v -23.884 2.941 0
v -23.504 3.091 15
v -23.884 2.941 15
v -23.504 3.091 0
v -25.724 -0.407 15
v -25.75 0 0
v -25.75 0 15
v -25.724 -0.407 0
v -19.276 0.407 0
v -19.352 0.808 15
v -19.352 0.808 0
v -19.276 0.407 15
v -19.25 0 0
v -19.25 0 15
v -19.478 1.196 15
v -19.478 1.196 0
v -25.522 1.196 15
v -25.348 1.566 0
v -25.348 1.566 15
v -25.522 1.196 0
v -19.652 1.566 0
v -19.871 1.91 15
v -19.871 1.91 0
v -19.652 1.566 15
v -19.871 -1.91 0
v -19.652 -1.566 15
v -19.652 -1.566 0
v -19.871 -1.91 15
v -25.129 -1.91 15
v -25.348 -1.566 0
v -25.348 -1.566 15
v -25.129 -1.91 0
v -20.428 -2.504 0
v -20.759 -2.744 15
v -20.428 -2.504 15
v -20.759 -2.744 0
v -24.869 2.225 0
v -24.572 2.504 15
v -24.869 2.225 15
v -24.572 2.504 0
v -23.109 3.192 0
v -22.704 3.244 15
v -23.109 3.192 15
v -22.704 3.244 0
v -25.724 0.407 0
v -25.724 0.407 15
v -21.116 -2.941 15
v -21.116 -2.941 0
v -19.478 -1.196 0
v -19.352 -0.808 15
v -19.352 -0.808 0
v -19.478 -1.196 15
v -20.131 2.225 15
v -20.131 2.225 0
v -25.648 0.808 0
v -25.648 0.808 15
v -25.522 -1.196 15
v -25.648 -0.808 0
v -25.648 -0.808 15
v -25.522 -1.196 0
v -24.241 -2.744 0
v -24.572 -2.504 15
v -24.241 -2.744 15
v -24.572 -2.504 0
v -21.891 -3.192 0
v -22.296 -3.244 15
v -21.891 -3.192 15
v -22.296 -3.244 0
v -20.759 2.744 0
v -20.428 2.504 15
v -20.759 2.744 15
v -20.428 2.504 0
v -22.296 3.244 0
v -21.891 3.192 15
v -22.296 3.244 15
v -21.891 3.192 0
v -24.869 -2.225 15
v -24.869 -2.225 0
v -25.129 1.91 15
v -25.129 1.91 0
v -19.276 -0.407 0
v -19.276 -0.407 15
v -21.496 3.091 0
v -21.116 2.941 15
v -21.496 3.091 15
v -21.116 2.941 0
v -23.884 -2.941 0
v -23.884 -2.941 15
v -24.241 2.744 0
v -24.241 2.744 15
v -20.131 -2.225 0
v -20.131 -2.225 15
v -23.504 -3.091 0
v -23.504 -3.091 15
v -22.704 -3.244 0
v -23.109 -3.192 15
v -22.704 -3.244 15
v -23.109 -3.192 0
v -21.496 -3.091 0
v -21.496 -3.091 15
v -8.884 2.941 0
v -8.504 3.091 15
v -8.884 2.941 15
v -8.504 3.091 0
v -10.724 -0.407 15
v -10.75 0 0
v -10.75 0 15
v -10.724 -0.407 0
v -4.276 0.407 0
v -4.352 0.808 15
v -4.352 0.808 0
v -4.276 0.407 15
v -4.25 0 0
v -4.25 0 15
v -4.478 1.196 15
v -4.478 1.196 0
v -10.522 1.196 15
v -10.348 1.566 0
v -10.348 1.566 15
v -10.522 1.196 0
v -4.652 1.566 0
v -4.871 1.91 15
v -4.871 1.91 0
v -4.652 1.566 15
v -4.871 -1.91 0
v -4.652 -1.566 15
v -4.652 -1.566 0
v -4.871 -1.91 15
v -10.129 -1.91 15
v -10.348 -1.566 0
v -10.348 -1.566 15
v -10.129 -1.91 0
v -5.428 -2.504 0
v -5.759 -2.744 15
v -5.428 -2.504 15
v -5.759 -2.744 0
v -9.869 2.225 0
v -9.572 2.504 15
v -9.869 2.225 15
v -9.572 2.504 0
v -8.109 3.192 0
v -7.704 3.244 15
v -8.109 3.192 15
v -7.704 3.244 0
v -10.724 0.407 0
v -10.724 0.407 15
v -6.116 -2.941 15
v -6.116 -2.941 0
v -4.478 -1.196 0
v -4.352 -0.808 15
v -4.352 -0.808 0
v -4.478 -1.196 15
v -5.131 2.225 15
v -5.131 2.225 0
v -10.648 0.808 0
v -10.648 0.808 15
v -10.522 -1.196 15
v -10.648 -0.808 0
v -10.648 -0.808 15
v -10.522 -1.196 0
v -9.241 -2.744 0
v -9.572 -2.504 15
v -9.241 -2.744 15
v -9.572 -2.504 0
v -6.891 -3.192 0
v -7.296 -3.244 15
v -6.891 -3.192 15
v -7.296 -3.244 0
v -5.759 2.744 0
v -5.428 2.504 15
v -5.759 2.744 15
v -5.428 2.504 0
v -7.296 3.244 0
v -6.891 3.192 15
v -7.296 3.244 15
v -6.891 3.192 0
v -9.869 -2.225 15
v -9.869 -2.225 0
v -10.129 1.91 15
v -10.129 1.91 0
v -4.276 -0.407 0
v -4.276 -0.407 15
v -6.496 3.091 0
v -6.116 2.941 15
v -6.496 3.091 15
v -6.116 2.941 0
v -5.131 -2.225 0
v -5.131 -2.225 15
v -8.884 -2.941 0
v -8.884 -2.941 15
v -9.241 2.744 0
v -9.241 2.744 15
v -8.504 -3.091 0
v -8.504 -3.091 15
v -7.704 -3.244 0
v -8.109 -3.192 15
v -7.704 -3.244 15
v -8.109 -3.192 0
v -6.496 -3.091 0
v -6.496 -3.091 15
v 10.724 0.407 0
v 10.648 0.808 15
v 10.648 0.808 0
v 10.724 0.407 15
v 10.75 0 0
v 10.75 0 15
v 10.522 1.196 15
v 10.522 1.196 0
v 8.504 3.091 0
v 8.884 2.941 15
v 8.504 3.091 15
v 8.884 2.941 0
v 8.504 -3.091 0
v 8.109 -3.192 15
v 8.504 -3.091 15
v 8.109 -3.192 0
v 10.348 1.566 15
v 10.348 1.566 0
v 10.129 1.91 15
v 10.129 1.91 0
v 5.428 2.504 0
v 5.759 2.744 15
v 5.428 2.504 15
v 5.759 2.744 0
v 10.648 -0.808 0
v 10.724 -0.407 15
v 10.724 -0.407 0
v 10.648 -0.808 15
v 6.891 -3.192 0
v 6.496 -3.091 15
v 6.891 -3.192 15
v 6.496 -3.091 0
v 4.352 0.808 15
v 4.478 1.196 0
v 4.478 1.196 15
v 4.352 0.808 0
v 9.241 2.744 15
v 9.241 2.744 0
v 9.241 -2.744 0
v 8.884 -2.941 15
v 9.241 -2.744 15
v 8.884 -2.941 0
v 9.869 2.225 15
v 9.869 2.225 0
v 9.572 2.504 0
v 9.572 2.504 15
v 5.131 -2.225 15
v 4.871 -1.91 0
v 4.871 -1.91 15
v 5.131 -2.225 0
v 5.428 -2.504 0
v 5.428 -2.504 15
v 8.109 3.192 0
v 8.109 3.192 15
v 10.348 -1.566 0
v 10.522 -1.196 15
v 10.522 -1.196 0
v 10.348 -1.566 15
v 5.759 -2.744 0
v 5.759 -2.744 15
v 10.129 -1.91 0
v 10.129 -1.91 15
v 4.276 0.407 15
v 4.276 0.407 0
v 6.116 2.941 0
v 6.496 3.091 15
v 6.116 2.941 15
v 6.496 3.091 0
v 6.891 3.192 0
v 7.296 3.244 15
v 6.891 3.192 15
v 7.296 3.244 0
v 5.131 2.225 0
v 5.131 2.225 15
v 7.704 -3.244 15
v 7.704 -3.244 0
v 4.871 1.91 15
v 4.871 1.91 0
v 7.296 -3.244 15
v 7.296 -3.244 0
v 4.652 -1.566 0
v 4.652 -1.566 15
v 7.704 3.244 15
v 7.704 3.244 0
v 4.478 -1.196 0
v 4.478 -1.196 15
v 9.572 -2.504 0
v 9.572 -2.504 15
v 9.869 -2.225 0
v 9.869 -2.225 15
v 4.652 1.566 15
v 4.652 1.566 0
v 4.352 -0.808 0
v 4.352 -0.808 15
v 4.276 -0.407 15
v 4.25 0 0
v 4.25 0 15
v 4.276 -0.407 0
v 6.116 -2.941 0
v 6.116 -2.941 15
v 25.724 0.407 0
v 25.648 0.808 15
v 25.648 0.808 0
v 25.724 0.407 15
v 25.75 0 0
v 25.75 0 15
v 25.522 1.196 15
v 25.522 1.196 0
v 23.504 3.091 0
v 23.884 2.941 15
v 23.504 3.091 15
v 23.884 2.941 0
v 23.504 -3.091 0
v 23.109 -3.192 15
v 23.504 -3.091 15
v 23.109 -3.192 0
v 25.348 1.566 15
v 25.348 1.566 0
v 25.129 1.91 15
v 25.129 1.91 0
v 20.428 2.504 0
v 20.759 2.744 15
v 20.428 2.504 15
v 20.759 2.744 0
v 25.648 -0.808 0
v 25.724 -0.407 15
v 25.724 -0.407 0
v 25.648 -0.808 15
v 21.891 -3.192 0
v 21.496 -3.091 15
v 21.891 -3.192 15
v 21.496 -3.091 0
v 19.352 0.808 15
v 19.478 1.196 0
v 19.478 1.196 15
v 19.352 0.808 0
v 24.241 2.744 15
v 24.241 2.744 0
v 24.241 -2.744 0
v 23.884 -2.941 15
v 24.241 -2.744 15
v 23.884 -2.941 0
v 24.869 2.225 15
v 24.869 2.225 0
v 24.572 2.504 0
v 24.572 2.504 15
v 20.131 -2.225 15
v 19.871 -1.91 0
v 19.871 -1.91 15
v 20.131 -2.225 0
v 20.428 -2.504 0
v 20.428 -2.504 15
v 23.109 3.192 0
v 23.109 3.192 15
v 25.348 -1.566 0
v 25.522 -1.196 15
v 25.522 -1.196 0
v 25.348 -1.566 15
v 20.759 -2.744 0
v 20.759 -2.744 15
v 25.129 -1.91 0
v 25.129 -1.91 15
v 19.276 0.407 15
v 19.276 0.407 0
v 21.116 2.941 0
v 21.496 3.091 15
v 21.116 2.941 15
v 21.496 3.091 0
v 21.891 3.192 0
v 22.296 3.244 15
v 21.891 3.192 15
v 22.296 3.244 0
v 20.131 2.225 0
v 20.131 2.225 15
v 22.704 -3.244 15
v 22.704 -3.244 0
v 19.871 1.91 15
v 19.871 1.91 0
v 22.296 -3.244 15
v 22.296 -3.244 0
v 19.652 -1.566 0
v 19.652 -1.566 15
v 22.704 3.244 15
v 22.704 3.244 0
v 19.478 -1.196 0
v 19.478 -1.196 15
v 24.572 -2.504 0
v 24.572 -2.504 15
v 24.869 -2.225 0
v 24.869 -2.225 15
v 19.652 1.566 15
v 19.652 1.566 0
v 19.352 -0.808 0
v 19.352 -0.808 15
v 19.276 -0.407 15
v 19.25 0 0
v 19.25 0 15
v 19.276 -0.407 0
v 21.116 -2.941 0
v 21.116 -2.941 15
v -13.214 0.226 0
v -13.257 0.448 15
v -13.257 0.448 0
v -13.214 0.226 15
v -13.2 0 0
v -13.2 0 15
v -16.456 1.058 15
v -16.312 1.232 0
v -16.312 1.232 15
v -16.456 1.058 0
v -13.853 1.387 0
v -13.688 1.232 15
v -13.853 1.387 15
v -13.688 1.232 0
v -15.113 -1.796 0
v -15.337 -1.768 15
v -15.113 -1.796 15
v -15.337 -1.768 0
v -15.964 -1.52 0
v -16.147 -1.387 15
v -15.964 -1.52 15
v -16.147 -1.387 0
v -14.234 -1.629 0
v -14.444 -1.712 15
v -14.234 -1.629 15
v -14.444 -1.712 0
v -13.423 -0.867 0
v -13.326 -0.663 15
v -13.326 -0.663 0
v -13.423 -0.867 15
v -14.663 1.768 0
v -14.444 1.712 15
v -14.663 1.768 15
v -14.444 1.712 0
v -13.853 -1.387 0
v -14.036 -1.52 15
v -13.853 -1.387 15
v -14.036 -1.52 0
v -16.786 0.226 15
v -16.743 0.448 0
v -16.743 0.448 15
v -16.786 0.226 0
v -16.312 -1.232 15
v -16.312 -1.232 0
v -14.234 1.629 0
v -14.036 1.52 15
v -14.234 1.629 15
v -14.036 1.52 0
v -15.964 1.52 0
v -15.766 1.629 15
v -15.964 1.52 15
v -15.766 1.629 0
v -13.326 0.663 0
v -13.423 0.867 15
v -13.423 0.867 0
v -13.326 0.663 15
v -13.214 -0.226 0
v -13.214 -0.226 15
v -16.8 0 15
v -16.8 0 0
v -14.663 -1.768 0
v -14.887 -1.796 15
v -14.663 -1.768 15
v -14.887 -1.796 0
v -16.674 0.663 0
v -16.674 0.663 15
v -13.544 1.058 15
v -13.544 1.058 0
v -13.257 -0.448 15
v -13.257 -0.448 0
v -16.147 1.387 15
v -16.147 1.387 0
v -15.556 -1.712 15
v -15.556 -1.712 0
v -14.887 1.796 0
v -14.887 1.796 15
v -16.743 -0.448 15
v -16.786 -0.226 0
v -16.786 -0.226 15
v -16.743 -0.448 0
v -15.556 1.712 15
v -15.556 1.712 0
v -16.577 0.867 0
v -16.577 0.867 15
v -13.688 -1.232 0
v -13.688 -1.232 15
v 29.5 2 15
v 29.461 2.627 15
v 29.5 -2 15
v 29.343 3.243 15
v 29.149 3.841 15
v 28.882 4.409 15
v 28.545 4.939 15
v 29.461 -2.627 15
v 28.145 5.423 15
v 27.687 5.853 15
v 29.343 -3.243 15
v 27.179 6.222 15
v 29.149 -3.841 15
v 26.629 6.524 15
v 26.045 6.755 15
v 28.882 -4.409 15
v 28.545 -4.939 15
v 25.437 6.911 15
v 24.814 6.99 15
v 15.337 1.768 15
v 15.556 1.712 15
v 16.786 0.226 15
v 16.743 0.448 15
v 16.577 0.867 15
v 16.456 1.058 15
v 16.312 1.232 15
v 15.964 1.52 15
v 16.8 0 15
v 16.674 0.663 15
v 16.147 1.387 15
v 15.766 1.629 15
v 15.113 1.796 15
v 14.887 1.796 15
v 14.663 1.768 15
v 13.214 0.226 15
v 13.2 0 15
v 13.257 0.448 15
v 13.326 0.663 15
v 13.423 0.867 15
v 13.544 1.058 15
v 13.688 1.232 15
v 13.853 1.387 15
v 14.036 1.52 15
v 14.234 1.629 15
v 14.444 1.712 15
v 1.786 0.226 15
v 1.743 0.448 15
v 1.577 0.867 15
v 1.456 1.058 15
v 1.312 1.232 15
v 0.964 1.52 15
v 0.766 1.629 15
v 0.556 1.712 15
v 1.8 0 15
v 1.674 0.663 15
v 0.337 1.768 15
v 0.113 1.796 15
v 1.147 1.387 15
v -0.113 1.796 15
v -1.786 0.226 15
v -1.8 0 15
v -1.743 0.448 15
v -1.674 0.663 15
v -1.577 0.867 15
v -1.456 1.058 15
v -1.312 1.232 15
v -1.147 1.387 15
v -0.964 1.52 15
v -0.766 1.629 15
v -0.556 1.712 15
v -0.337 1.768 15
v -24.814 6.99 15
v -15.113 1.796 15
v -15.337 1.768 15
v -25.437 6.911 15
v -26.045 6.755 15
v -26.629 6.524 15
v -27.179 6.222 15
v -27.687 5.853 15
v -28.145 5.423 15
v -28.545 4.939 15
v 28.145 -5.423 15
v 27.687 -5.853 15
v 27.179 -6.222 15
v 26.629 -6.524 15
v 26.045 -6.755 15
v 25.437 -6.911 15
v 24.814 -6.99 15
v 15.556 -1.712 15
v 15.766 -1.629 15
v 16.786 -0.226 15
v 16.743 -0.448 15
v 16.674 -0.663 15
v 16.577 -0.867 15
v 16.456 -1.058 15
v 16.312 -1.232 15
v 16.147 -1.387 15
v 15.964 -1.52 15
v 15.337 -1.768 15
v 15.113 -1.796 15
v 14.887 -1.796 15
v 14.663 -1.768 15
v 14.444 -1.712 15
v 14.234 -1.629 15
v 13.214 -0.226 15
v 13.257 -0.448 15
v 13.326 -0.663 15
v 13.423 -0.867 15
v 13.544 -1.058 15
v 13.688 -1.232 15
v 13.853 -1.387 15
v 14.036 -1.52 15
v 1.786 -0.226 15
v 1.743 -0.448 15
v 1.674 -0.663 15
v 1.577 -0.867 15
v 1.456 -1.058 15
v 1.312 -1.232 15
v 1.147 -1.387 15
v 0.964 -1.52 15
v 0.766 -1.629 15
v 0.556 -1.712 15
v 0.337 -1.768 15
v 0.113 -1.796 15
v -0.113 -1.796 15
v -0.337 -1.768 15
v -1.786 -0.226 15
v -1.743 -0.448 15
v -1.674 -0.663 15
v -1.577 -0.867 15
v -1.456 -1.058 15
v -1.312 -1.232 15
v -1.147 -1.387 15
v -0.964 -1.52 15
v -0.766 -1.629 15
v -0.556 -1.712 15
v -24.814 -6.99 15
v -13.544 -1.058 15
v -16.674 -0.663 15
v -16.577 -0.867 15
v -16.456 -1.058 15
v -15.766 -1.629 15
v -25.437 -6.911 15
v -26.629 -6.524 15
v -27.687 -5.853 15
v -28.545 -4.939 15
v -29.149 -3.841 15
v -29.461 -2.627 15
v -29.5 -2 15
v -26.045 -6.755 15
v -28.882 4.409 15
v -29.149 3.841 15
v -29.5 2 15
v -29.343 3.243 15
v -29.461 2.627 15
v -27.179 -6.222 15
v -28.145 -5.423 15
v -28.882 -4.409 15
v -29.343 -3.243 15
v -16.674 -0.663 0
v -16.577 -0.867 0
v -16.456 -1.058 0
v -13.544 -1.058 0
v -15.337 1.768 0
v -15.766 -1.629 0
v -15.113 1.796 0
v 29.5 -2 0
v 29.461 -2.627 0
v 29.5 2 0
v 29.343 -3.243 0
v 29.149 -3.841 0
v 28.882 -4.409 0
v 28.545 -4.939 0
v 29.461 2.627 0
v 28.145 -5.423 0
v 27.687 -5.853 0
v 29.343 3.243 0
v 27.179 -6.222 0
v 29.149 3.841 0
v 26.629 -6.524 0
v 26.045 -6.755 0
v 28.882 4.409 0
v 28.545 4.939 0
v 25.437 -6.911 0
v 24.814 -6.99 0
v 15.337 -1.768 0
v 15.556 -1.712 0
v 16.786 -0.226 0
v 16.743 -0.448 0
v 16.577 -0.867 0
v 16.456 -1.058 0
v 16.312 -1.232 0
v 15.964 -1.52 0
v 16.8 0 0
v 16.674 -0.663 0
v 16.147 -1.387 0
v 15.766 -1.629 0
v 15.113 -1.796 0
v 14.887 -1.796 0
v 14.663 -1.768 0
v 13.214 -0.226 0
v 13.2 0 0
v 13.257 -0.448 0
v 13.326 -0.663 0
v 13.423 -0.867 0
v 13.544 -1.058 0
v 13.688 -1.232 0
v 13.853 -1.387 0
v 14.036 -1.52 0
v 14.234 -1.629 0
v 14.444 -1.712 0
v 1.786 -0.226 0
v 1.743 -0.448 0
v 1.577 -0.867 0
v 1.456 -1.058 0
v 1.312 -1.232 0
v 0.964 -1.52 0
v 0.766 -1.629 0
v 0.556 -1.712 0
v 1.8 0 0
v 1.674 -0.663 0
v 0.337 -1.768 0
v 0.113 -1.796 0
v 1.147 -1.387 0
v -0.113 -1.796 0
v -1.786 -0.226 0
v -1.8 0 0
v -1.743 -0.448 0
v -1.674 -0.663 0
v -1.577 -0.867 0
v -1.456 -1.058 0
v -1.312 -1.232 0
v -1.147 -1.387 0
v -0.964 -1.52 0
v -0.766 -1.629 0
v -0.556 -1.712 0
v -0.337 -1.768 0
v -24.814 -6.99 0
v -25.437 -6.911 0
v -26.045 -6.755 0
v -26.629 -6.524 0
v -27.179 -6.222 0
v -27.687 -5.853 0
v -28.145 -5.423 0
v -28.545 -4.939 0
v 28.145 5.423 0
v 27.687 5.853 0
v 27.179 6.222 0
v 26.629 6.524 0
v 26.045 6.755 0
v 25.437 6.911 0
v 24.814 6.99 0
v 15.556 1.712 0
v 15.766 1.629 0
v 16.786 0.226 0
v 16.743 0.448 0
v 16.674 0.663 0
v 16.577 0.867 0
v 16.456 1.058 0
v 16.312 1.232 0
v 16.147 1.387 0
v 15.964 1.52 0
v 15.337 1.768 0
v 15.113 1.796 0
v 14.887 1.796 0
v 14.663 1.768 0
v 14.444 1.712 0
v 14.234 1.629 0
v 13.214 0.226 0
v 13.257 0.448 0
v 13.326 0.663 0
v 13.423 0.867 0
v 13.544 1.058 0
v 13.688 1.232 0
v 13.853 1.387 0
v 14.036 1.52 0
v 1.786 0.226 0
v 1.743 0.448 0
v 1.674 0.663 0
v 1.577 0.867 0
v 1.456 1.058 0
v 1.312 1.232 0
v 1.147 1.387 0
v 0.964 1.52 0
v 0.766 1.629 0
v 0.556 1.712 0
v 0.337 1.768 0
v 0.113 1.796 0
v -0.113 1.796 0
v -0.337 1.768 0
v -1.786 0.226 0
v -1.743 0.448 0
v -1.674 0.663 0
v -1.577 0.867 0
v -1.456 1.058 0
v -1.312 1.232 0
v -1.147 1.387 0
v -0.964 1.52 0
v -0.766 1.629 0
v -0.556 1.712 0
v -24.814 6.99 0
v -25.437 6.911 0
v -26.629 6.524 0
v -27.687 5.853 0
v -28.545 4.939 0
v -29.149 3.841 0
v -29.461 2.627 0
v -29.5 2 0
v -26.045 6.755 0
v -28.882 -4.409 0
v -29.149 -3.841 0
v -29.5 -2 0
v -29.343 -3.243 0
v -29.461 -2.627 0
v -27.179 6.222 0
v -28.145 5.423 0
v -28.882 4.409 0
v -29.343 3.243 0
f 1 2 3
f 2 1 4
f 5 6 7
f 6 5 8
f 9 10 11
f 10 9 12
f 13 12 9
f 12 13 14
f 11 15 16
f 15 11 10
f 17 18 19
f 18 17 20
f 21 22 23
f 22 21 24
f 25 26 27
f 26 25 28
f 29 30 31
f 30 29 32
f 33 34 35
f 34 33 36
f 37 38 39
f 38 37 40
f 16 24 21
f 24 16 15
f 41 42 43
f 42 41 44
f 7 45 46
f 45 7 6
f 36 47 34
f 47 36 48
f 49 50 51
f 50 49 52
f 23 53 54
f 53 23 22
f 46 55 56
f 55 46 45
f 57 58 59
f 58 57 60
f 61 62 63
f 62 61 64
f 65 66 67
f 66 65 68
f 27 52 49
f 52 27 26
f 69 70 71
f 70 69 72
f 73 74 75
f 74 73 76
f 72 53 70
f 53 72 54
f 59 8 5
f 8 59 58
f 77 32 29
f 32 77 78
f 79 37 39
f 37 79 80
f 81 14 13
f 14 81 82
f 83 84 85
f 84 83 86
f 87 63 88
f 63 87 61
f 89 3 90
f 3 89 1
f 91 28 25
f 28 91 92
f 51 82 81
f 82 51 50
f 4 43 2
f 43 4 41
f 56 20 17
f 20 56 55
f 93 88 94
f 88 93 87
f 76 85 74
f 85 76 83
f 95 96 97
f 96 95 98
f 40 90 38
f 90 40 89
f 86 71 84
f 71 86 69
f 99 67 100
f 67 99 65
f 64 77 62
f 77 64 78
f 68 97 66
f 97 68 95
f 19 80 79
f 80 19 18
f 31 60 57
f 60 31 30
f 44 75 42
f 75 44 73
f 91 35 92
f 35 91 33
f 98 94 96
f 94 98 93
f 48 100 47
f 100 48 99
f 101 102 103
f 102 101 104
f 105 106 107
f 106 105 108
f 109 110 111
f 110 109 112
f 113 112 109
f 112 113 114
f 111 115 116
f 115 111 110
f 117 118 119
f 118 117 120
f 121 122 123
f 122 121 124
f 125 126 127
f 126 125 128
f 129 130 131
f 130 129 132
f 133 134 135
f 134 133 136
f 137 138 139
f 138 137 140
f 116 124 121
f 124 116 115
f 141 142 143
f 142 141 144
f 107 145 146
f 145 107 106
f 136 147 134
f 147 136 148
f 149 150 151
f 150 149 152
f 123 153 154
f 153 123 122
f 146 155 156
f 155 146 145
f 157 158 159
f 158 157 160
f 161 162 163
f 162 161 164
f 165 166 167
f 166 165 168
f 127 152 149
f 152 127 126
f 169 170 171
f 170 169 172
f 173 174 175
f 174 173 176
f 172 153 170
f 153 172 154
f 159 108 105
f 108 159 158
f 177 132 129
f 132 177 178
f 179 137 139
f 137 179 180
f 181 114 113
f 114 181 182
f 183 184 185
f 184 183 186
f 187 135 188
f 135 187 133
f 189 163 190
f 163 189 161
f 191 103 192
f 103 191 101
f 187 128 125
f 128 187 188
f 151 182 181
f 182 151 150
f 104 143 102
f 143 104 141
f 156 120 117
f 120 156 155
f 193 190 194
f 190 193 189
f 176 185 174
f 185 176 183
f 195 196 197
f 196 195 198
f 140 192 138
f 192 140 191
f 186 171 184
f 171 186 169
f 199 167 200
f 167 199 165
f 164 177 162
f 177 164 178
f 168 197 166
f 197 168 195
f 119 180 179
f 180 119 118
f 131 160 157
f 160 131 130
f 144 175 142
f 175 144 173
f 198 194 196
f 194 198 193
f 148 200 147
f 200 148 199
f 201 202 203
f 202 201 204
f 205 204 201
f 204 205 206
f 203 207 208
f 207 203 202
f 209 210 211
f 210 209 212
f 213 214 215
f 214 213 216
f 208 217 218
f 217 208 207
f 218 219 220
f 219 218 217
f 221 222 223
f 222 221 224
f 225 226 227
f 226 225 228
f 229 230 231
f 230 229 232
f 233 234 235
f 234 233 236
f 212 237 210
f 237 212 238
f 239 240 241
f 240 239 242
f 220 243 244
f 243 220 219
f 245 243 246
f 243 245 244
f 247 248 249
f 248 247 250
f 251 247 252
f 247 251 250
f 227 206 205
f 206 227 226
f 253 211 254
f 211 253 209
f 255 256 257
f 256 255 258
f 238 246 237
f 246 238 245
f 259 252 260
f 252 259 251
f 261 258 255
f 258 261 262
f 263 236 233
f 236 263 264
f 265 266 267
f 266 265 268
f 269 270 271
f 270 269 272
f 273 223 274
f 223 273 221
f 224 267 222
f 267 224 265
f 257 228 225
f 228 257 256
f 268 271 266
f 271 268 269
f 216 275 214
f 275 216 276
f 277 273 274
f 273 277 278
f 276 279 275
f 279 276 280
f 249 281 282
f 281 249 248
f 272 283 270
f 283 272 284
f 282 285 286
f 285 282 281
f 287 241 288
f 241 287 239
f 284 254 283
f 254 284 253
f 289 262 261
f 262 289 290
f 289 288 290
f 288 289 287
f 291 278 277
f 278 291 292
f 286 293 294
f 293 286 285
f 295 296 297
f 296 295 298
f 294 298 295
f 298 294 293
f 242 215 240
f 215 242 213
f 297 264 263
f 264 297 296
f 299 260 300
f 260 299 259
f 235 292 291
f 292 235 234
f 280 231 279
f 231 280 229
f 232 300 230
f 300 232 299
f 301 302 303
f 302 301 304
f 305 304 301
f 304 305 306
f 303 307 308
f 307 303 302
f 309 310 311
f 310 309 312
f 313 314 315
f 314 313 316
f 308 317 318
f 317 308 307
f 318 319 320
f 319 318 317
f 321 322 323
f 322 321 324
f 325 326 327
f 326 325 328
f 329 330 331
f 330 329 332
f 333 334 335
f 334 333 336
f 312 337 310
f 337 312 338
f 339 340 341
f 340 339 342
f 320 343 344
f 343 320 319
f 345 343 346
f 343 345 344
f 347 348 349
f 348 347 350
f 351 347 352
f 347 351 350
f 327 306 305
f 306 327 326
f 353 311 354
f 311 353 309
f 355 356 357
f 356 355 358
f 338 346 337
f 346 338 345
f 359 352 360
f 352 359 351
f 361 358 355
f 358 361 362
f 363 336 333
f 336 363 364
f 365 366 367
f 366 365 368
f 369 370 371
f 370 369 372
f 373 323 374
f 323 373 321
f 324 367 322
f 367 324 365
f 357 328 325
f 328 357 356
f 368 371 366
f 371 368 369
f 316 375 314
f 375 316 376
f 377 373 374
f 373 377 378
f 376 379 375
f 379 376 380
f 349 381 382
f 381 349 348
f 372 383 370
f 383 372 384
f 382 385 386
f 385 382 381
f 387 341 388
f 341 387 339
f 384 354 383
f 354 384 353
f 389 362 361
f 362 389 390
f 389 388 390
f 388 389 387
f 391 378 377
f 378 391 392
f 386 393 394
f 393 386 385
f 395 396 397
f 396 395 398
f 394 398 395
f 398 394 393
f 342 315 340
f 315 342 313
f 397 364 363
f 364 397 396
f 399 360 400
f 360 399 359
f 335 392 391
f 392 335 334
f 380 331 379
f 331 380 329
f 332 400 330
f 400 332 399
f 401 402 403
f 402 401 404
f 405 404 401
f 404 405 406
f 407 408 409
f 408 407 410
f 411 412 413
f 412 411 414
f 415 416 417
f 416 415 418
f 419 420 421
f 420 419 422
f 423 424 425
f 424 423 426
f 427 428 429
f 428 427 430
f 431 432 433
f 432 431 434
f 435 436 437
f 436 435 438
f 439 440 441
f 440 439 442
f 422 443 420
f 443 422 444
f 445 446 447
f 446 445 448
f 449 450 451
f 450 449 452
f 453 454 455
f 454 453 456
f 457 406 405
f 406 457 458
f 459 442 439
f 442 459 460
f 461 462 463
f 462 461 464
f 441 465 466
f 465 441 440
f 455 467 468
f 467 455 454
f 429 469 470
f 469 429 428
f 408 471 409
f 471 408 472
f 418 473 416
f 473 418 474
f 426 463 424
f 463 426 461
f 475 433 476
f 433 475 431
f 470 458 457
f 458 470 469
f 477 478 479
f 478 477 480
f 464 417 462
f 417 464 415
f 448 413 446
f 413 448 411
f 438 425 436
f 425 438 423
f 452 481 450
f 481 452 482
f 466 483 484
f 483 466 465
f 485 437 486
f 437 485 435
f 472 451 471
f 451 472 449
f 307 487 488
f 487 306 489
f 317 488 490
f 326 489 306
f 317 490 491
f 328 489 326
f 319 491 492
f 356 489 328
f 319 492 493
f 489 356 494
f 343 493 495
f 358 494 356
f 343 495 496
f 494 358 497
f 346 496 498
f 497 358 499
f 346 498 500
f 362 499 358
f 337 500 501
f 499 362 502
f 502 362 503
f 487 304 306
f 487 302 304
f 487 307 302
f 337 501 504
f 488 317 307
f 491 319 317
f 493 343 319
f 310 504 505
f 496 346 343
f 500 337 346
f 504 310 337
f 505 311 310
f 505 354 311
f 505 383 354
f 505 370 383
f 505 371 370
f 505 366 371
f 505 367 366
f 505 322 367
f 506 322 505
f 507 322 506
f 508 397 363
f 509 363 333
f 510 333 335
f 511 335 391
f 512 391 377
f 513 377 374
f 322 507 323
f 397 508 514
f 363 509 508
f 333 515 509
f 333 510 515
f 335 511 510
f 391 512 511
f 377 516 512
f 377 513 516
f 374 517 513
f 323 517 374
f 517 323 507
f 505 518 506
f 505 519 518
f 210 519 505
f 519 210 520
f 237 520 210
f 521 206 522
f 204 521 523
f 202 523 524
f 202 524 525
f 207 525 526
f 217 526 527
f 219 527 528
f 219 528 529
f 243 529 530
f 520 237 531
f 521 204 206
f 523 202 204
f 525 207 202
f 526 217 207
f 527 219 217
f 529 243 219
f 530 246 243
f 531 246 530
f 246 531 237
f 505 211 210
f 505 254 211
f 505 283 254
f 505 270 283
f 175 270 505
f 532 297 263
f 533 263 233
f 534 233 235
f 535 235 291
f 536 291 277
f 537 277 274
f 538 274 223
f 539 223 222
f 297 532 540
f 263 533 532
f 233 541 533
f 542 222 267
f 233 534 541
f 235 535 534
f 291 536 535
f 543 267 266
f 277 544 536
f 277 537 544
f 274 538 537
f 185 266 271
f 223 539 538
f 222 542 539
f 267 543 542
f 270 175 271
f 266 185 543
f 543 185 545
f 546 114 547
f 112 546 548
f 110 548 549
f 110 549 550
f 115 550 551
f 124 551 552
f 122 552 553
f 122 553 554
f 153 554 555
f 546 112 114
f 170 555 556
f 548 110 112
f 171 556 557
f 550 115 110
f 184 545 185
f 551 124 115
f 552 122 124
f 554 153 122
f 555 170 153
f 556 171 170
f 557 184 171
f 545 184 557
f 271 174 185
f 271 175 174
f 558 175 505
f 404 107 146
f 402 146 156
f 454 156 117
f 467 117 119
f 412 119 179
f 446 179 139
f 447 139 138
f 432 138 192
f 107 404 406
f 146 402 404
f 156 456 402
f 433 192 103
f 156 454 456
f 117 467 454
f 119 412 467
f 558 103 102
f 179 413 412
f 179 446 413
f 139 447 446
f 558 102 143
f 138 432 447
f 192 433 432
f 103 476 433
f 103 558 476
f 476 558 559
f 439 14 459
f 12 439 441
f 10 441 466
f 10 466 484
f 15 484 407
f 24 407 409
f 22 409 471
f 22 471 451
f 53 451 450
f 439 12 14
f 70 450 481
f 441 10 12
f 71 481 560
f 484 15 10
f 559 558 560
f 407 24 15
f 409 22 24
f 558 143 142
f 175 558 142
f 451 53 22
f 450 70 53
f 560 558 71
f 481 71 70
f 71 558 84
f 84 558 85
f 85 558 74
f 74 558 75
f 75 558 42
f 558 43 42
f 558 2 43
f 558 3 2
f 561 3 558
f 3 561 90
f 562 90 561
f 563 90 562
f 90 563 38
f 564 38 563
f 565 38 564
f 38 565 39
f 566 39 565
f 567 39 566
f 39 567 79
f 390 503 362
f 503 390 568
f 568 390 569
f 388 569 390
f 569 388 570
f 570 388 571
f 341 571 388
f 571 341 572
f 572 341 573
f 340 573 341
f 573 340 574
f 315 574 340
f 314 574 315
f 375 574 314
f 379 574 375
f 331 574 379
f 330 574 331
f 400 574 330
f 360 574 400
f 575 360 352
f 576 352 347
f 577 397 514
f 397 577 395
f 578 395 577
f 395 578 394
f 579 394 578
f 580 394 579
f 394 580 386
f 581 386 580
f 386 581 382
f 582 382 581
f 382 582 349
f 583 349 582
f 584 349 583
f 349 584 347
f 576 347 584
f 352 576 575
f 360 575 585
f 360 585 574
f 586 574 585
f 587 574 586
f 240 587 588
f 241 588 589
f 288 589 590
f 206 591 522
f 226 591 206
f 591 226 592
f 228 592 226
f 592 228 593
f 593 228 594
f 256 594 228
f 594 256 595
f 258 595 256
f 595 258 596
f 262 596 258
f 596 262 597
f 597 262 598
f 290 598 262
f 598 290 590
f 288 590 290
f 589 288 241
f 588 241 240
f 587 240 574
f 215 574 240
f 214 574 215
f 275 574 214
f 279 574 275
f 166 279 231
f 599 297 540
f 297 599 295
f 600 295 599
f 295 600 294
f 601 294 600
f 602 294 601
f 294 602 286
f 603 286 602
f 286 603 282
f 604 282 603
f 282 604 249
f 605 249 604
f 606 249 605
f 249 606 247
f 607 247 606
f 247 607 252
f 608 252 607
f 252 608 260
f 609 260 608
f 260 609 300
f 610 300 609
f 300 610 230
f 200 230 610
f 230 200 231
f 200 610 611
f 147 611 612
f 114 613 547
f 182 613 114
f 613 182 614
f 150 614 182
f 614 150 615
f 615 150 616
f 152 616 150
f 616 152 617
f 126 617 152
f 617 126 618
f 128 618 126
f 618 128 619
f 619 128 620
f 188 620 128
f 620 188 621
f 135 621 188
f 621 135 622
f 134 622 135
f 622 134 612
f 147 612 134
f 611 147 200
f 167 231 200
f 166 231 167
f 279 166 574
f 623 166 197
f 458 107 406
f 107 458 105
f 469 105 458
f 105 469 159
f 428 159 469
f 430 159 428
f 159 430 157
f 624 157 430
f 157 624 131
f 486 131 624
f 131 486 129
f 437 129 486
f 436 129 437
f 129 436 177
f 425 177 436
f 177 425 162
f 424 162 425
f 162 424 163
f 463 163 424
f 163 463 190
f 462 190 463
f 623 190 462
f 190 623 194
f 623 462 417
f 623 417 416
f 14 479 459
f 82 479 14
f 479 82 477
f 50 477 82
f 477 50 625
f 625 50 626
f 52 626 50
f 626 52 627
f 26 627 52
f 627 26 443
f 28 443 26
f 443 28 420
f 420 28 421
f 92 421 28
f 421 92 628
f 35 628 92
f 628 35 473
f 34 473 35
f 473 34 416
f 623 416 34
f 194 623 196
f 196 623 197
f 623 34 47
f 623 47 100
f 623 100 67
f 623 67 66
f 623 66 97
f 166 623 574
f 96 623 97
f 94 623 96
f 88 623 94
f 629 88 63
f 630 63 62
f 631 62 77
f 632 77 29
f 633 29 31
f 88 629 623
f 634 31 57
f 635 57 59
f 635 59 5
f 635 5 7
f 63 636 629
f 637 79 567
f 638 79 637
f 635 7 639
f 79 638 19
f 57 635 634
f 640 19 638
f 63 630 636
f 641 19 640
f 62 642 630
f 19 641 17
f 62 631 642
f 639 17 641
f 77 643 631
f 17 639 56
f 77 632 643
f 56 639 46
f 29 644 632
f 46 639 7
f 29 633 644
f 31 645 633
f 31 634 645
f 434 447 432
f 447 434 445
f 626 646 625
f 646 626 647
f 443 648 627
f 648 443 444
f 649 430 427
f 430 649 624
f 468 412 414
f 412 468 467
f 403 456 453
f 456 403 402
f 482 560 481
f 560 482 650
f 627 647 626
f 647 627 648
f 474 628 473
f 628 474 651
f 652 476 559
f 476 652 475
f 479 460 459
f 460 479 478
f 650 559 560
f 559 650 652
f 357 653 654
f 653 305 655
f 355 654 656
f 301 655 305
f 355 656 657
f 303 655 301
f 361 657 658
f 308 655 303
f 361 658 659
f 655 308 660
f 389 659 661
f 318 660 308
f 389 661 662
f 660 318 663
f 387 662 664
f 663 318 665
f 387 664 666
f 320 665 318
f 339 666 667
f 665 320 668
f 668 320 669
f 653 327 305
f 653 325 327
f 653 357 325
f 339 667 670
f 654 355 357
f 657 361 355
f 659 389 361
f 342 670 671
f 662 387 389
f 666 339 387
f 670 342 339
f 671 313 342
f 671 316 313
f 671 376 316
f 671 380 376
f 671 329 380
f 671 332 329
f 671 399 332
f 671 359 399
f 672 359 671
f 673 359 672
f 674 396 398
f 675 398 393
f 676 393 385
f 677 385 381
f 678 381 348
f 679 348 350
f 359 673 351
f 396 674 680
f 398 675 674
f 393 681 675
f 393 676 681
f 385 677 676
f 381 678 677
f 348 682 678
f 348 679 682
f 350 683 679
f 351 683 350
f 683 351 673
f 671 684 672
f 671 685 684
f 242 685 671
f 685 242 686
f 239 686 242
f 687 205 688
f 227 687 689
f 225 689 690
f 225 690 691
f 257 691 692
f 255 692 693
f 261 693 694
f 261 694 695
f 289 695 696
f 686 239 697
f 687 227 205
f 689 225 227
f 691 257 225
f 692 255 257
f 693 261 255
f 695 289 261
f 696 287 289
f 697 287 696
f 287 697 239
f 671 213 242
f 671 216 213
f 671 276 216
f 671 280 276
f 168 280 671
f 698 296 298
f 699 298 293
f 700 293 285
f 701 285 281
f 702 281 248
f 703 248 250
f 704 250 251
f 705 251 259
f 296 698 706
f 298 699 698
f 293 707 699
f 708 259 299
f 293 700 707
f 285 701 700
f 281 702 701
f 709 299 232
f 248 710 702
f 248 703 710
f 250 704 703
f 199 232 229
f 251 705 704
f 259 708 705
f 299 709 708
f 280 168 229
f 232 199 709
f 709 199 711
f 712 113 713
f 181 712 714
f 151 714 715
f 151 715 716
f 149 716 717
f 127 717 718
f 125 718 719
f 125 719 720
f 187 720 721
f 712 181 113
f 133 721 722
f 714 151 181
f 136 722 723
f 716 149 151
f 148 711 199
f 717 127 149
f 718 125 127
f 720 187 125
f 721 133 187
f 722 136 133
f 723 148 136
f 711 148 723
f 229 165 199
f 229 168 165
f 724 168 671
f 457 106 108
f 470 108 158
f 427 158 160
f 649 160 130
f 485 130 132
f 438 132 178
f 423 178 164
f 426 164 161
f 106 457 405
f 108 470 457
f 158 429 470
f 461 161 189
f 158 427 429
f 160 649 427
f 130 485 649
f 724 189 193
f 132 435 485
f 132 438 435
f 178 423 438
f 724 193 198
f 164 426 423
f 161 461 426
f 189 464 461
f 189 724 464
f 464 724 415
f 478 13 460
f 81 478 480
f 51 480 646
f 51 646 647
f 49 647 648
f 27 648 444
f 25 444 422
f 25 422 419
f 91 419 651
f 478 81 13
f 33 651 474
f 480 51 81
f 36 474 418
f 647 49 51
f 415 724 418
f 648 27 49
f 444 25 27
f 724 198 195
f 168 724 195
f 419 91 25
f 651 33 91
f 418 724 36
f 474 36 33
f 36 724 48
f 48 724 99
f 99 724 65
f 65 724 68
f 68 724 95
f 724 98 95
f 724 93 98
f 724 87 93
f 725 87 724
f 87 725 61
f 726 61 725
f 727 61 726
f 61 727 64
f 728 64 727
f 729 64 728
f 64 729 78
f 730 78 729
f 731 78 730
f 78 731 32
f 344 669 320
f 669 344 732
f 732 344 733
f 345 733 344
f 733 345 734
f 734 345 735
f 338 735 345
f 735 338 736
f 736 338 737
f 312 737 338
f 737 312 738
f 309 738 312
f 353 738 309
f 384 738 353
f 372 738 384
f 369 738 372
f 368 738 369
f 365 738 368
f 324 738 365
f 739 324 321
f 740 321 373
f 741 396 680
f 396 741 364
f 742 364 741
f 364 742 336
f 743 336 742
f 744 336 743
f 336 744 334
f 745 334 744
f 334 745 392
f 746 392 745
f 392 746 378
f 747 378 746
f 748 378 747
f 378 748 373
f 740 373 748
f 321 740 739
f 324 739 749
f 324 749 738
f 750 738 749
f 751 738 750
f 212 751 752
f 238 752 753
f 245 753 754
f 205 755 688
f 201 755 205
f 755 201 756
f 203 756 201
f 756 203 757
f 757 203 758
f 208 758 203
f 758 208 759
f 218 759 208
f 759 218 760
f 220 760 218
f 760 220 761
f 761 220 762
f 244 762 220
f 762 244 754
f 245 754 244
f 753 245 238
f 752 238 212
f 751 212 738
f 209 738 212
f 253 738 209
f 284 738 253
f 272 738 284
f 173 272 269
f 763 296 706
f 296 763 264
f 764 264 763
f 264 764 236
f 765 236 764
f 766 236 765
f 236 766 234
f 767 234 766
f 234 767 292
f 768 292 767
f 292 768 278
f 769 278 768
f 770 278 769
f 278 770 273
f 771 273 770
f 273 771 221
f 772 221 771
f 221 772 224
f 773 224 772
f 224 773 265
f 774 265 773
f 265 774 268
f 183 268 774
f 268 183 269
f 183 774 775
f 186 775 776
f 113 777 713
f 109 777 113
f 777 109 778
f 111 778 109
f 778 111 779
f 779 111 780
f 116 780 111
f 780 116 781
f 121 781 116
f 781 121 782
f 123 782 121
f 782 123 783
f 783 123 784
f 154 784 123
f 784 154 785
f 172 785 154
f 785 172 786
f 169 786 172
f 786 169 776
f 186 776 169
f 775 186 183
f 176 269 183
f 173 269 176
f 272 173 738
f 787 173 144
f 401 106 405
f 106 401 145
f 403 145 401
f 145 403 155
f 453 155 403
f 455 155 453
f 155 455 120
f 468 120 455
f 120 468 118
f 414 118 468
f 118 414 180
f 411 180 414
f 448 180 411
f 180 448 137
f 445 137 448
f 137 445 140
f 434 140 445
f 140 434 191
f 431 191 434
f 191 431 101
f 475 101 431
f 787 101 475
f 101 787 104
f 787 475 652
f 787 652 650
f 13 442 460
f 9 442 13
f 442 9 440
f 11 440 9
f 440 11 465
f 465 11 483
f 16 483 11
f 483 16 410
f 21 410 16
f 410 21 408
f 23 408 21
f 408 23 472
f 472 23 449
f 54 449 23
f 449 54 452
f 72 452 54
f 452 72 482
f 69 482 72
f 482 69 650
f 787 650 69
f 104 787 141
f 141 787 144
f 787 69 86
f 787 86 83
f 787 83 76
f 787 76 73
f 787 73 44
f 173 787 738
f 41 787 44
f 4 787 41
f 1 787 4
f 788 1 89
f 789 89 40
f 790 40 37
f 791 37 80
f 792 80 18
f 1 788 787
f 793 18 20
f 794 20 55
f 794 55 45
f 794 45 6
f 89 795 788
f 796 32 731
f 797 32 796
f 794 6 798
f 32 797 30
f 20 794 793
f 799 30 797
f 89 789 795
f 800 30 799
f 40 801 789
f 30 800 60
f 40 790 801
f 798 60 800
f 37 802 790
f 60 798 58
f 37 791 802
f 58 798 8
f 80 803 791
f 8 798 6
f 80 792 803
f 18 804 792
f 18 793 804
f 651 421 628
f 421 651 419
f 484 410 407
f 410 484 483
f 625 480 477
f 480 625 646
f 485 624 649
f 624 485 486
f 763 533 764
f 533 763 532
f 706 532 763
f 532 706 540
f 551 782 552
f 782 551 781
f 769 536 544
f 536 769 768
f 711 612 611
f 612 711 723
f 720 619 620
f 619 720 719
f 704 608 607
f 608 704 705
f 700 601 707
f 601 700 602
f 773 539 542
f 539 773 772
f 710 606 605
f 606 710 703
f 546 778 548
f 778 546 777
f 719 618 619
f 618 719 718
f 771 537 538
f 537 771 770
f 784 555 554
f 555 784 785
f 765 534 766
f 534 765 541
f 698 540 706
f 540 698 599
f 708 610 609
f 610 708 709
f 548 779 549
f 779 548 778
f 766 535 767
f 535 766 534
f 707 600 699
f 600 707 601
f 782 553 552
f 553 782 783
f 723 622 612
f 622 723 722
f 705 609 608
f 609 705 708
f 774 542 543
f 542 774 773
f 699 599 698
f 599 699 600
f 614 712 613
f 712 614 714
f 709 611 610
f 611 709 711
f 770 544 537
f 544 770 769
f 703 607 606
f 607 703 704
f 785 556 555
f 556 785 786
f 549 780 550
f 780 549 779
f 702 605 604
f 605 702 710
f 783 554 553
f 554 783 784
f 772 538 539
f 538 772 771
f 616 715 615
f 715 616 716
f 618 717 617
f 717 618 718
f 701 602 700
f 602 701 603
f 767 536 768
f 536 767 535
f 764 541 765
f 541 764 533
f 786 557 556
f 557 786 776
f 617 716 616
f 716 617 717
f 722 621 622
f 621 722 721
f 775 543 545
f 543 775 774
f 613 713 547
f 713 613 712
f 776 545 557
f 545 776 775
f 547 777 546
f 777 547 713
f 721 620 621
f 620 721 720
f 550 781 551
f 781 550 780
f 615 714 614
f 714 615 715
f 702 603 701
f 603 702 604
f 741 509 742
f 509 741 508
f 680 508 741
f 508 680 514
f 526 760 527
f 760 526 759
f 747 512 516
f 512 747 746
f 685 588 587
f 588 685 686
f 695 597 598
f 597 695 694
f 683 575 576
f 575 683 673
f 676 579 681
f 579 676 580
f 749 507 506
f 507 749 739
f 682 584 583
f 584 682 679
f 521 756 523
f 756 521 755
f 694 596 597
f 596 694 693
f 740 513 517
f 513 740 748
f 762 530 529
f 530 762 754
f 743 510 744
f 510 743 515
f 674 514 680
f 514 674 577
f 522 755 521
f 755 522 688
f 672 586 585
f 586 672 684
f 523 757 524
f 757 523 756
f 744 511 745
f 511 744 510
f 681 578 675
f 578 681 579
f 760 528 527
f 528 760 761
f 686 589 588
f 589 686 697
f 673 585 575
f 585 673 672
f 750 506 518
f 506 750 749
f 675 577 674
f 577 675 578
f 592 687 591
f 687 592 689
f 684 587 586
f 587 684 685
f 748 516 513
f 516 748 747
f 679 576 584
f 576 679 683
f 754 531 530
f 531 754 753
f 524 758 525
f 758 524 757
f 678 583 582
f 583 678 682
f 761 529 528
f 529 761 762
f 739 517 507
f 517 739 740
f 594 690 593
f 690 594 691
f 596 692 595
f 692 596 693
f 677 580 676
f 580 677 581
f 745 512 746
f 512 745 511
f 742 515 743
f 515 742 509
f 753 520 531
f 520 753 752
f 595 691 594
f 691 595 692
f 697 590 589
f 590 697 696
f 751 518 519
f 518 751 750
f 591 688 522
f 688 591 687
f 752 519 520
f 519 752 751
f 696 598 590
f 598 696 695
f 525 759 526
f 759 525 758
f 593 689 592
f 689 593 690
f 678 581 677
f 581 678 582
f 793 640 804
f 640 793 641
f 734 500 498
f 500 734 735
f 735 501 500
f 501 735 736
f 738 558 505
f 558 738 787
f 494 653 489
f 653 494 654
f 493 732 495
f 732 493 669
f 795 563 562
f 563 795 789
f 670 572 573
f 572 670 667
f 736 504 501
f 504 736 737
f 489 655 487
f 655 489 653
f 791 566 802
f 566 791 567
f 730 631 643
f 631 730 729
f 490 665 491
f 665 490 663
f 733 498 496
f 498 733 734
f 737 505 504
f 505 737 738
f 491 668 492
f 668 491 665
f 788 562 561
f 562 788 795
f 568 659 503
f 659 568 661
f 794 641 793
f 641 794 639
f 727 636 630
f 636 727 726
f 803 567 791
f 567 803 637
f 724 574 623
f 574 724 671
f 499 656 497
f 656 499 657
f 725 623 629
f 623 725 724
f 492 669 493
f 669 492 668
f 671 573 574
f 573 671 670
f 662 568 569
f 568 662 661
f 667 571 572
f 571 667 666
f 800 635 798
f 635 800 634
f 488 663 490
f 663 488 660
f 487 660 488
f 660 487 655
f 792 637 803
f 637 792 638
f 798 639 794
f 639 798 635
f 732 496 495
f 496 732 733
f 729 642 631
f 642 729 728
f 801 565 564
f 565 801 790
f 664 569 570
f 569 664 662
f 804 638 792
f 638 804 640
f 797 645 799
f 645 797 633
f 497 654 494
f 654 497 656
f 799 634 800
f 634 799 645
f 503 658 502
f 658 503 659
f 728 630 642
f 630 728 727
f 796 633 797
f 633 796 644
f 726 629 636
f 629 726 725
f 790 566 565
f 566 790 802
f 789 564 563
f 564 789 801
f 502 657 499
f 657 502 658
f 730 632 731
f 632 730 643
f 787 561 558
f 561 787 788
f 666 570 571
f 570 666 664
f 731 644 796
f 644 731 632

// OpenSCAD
$fn = 50;


difference() {
	union() {
		hull() {
			translate(v = [-24.5000000000, 2.0000000000, 0]) {
				cylinder(h = 15, r = 5);
			}
			translate(v = [24.5000000000, 2.0000000000, 0]) {
				cylinder(h = 15, r = 5);
			}
			translate(v = [-24.5000000000, -2.0000000000, 0]) {
				cylinder(h = 15, r = 5);
			}
			translate(v = [24.5000000000, -2.0000000000, 0]) {
				cylinder(h = 15, r = 5);
			}
		}
	}
	union() {
		translate(v = [-22.5000000000, 0.0000000000, -100.0000000000]) {
			cylinder(h = 200, r = 3.2500000000);
		}
		translate(v = [-7.5000000000, 0.0000000000, -100.0000000000]) {
			cylinder(h = 200, r = 3.2500000000);
		}
		translate(v = [7.5000000000, 0.0000000000, -100.0000000000]) {
			cylinder(h = 200, r = 3.2500000000);
		}
		translate(v = [22.5000000000, 0.0000000000, -100.0000000000]) {
			cylinder(h = 200, r = 3.2500000000);
		}
		translate(v = [-22.5000000000, 0.0000000000, 0]) {
			cylinder(h = 15, r = 1.8000000000);
		}
		translate(v = [-15.0000000000, 0.0000000000, 0]) {
			cylinder(h = 15, r = 1.8000000000);
		}
		translate(v = [-7.5000000000, 0.0000000000, 0]) {
			cylinder(h = 15, r = 1.8000000000);
		}
		cylinder(h = 15, r = 1.8000000000);
		translate(v = [7.5000000000, 0.0000000000, 0]) {
			cylinder(h = 15, r = 1.8000000000);
		}
		translate(v = [15.0000000000, 0.0000000000, 0]) {
			cylinder(h = 15, r = 1.8000000000);
		}
		translate(v = [22.5000000000, 0.0000000000, 0]) {
			cylinder(h = 15, r = 1.8000000000);
		}
		translate(v = [-22.5000000000, 0.0000000000, 0]) {
			cylinder(h = 15, r = 1.8000000000);
		}
		translate(v = [-15.0000000000, 0.0000000000, 0]) {
			cylinder(h = 15, r = 1.8000000000);
		}
		translate(v = [-7.5000000000, 0.0000000000, 0]) {
			cylinder(h = 15, r = 1.8000000000);
		}
		cylinder(h = 15, r = 1.8000000000);
		translate(v = [7.5000000000, 0.0000000000, 0]) {
			cylinder(h = 15, r = 1.8000000000);
		}
		translate(v = [15.0000000000, 0.0000000000, 0]) {
			cylinder(h = 15, r = 1.8000000000);
		}
		translate(v = [22.5000000000, 0.0000000000, 0]) {
			cylinder(h = 15, r = 1.8000000000);
		}
		translate(v = [-22.5000000000, 0.0000000000, 0]) {
			cylinder(h = 15, r = 1.8000000000);
		}
		translate(v = [-15.0000000000, 0.0000000000, 0]) {
			cylinder(h = 15, r = 1.8000000000);
		}
		translate(v = [-7.5000000000, 0.0000000000, 0]) {
			cylinder(h = 15, r = 1.8000000000);
		}
		cylinder(h = 15, r = 1.8000000000);
		translate(v = [7.5000000000, 0.0000000000, 0]) {
			cylinder(h = 15, r = 1.8000000000);
		}
		translate(v = [15.0000000000, 0.0000000000, 0]) {
			cylinder(h = 15, r = 1.8000000000);
		}
		translate(v = [22.5000000000, 0.0000000000, 0]) {
			cylinder(h = 15, r = 1.8000000000);
		}
	}
}
